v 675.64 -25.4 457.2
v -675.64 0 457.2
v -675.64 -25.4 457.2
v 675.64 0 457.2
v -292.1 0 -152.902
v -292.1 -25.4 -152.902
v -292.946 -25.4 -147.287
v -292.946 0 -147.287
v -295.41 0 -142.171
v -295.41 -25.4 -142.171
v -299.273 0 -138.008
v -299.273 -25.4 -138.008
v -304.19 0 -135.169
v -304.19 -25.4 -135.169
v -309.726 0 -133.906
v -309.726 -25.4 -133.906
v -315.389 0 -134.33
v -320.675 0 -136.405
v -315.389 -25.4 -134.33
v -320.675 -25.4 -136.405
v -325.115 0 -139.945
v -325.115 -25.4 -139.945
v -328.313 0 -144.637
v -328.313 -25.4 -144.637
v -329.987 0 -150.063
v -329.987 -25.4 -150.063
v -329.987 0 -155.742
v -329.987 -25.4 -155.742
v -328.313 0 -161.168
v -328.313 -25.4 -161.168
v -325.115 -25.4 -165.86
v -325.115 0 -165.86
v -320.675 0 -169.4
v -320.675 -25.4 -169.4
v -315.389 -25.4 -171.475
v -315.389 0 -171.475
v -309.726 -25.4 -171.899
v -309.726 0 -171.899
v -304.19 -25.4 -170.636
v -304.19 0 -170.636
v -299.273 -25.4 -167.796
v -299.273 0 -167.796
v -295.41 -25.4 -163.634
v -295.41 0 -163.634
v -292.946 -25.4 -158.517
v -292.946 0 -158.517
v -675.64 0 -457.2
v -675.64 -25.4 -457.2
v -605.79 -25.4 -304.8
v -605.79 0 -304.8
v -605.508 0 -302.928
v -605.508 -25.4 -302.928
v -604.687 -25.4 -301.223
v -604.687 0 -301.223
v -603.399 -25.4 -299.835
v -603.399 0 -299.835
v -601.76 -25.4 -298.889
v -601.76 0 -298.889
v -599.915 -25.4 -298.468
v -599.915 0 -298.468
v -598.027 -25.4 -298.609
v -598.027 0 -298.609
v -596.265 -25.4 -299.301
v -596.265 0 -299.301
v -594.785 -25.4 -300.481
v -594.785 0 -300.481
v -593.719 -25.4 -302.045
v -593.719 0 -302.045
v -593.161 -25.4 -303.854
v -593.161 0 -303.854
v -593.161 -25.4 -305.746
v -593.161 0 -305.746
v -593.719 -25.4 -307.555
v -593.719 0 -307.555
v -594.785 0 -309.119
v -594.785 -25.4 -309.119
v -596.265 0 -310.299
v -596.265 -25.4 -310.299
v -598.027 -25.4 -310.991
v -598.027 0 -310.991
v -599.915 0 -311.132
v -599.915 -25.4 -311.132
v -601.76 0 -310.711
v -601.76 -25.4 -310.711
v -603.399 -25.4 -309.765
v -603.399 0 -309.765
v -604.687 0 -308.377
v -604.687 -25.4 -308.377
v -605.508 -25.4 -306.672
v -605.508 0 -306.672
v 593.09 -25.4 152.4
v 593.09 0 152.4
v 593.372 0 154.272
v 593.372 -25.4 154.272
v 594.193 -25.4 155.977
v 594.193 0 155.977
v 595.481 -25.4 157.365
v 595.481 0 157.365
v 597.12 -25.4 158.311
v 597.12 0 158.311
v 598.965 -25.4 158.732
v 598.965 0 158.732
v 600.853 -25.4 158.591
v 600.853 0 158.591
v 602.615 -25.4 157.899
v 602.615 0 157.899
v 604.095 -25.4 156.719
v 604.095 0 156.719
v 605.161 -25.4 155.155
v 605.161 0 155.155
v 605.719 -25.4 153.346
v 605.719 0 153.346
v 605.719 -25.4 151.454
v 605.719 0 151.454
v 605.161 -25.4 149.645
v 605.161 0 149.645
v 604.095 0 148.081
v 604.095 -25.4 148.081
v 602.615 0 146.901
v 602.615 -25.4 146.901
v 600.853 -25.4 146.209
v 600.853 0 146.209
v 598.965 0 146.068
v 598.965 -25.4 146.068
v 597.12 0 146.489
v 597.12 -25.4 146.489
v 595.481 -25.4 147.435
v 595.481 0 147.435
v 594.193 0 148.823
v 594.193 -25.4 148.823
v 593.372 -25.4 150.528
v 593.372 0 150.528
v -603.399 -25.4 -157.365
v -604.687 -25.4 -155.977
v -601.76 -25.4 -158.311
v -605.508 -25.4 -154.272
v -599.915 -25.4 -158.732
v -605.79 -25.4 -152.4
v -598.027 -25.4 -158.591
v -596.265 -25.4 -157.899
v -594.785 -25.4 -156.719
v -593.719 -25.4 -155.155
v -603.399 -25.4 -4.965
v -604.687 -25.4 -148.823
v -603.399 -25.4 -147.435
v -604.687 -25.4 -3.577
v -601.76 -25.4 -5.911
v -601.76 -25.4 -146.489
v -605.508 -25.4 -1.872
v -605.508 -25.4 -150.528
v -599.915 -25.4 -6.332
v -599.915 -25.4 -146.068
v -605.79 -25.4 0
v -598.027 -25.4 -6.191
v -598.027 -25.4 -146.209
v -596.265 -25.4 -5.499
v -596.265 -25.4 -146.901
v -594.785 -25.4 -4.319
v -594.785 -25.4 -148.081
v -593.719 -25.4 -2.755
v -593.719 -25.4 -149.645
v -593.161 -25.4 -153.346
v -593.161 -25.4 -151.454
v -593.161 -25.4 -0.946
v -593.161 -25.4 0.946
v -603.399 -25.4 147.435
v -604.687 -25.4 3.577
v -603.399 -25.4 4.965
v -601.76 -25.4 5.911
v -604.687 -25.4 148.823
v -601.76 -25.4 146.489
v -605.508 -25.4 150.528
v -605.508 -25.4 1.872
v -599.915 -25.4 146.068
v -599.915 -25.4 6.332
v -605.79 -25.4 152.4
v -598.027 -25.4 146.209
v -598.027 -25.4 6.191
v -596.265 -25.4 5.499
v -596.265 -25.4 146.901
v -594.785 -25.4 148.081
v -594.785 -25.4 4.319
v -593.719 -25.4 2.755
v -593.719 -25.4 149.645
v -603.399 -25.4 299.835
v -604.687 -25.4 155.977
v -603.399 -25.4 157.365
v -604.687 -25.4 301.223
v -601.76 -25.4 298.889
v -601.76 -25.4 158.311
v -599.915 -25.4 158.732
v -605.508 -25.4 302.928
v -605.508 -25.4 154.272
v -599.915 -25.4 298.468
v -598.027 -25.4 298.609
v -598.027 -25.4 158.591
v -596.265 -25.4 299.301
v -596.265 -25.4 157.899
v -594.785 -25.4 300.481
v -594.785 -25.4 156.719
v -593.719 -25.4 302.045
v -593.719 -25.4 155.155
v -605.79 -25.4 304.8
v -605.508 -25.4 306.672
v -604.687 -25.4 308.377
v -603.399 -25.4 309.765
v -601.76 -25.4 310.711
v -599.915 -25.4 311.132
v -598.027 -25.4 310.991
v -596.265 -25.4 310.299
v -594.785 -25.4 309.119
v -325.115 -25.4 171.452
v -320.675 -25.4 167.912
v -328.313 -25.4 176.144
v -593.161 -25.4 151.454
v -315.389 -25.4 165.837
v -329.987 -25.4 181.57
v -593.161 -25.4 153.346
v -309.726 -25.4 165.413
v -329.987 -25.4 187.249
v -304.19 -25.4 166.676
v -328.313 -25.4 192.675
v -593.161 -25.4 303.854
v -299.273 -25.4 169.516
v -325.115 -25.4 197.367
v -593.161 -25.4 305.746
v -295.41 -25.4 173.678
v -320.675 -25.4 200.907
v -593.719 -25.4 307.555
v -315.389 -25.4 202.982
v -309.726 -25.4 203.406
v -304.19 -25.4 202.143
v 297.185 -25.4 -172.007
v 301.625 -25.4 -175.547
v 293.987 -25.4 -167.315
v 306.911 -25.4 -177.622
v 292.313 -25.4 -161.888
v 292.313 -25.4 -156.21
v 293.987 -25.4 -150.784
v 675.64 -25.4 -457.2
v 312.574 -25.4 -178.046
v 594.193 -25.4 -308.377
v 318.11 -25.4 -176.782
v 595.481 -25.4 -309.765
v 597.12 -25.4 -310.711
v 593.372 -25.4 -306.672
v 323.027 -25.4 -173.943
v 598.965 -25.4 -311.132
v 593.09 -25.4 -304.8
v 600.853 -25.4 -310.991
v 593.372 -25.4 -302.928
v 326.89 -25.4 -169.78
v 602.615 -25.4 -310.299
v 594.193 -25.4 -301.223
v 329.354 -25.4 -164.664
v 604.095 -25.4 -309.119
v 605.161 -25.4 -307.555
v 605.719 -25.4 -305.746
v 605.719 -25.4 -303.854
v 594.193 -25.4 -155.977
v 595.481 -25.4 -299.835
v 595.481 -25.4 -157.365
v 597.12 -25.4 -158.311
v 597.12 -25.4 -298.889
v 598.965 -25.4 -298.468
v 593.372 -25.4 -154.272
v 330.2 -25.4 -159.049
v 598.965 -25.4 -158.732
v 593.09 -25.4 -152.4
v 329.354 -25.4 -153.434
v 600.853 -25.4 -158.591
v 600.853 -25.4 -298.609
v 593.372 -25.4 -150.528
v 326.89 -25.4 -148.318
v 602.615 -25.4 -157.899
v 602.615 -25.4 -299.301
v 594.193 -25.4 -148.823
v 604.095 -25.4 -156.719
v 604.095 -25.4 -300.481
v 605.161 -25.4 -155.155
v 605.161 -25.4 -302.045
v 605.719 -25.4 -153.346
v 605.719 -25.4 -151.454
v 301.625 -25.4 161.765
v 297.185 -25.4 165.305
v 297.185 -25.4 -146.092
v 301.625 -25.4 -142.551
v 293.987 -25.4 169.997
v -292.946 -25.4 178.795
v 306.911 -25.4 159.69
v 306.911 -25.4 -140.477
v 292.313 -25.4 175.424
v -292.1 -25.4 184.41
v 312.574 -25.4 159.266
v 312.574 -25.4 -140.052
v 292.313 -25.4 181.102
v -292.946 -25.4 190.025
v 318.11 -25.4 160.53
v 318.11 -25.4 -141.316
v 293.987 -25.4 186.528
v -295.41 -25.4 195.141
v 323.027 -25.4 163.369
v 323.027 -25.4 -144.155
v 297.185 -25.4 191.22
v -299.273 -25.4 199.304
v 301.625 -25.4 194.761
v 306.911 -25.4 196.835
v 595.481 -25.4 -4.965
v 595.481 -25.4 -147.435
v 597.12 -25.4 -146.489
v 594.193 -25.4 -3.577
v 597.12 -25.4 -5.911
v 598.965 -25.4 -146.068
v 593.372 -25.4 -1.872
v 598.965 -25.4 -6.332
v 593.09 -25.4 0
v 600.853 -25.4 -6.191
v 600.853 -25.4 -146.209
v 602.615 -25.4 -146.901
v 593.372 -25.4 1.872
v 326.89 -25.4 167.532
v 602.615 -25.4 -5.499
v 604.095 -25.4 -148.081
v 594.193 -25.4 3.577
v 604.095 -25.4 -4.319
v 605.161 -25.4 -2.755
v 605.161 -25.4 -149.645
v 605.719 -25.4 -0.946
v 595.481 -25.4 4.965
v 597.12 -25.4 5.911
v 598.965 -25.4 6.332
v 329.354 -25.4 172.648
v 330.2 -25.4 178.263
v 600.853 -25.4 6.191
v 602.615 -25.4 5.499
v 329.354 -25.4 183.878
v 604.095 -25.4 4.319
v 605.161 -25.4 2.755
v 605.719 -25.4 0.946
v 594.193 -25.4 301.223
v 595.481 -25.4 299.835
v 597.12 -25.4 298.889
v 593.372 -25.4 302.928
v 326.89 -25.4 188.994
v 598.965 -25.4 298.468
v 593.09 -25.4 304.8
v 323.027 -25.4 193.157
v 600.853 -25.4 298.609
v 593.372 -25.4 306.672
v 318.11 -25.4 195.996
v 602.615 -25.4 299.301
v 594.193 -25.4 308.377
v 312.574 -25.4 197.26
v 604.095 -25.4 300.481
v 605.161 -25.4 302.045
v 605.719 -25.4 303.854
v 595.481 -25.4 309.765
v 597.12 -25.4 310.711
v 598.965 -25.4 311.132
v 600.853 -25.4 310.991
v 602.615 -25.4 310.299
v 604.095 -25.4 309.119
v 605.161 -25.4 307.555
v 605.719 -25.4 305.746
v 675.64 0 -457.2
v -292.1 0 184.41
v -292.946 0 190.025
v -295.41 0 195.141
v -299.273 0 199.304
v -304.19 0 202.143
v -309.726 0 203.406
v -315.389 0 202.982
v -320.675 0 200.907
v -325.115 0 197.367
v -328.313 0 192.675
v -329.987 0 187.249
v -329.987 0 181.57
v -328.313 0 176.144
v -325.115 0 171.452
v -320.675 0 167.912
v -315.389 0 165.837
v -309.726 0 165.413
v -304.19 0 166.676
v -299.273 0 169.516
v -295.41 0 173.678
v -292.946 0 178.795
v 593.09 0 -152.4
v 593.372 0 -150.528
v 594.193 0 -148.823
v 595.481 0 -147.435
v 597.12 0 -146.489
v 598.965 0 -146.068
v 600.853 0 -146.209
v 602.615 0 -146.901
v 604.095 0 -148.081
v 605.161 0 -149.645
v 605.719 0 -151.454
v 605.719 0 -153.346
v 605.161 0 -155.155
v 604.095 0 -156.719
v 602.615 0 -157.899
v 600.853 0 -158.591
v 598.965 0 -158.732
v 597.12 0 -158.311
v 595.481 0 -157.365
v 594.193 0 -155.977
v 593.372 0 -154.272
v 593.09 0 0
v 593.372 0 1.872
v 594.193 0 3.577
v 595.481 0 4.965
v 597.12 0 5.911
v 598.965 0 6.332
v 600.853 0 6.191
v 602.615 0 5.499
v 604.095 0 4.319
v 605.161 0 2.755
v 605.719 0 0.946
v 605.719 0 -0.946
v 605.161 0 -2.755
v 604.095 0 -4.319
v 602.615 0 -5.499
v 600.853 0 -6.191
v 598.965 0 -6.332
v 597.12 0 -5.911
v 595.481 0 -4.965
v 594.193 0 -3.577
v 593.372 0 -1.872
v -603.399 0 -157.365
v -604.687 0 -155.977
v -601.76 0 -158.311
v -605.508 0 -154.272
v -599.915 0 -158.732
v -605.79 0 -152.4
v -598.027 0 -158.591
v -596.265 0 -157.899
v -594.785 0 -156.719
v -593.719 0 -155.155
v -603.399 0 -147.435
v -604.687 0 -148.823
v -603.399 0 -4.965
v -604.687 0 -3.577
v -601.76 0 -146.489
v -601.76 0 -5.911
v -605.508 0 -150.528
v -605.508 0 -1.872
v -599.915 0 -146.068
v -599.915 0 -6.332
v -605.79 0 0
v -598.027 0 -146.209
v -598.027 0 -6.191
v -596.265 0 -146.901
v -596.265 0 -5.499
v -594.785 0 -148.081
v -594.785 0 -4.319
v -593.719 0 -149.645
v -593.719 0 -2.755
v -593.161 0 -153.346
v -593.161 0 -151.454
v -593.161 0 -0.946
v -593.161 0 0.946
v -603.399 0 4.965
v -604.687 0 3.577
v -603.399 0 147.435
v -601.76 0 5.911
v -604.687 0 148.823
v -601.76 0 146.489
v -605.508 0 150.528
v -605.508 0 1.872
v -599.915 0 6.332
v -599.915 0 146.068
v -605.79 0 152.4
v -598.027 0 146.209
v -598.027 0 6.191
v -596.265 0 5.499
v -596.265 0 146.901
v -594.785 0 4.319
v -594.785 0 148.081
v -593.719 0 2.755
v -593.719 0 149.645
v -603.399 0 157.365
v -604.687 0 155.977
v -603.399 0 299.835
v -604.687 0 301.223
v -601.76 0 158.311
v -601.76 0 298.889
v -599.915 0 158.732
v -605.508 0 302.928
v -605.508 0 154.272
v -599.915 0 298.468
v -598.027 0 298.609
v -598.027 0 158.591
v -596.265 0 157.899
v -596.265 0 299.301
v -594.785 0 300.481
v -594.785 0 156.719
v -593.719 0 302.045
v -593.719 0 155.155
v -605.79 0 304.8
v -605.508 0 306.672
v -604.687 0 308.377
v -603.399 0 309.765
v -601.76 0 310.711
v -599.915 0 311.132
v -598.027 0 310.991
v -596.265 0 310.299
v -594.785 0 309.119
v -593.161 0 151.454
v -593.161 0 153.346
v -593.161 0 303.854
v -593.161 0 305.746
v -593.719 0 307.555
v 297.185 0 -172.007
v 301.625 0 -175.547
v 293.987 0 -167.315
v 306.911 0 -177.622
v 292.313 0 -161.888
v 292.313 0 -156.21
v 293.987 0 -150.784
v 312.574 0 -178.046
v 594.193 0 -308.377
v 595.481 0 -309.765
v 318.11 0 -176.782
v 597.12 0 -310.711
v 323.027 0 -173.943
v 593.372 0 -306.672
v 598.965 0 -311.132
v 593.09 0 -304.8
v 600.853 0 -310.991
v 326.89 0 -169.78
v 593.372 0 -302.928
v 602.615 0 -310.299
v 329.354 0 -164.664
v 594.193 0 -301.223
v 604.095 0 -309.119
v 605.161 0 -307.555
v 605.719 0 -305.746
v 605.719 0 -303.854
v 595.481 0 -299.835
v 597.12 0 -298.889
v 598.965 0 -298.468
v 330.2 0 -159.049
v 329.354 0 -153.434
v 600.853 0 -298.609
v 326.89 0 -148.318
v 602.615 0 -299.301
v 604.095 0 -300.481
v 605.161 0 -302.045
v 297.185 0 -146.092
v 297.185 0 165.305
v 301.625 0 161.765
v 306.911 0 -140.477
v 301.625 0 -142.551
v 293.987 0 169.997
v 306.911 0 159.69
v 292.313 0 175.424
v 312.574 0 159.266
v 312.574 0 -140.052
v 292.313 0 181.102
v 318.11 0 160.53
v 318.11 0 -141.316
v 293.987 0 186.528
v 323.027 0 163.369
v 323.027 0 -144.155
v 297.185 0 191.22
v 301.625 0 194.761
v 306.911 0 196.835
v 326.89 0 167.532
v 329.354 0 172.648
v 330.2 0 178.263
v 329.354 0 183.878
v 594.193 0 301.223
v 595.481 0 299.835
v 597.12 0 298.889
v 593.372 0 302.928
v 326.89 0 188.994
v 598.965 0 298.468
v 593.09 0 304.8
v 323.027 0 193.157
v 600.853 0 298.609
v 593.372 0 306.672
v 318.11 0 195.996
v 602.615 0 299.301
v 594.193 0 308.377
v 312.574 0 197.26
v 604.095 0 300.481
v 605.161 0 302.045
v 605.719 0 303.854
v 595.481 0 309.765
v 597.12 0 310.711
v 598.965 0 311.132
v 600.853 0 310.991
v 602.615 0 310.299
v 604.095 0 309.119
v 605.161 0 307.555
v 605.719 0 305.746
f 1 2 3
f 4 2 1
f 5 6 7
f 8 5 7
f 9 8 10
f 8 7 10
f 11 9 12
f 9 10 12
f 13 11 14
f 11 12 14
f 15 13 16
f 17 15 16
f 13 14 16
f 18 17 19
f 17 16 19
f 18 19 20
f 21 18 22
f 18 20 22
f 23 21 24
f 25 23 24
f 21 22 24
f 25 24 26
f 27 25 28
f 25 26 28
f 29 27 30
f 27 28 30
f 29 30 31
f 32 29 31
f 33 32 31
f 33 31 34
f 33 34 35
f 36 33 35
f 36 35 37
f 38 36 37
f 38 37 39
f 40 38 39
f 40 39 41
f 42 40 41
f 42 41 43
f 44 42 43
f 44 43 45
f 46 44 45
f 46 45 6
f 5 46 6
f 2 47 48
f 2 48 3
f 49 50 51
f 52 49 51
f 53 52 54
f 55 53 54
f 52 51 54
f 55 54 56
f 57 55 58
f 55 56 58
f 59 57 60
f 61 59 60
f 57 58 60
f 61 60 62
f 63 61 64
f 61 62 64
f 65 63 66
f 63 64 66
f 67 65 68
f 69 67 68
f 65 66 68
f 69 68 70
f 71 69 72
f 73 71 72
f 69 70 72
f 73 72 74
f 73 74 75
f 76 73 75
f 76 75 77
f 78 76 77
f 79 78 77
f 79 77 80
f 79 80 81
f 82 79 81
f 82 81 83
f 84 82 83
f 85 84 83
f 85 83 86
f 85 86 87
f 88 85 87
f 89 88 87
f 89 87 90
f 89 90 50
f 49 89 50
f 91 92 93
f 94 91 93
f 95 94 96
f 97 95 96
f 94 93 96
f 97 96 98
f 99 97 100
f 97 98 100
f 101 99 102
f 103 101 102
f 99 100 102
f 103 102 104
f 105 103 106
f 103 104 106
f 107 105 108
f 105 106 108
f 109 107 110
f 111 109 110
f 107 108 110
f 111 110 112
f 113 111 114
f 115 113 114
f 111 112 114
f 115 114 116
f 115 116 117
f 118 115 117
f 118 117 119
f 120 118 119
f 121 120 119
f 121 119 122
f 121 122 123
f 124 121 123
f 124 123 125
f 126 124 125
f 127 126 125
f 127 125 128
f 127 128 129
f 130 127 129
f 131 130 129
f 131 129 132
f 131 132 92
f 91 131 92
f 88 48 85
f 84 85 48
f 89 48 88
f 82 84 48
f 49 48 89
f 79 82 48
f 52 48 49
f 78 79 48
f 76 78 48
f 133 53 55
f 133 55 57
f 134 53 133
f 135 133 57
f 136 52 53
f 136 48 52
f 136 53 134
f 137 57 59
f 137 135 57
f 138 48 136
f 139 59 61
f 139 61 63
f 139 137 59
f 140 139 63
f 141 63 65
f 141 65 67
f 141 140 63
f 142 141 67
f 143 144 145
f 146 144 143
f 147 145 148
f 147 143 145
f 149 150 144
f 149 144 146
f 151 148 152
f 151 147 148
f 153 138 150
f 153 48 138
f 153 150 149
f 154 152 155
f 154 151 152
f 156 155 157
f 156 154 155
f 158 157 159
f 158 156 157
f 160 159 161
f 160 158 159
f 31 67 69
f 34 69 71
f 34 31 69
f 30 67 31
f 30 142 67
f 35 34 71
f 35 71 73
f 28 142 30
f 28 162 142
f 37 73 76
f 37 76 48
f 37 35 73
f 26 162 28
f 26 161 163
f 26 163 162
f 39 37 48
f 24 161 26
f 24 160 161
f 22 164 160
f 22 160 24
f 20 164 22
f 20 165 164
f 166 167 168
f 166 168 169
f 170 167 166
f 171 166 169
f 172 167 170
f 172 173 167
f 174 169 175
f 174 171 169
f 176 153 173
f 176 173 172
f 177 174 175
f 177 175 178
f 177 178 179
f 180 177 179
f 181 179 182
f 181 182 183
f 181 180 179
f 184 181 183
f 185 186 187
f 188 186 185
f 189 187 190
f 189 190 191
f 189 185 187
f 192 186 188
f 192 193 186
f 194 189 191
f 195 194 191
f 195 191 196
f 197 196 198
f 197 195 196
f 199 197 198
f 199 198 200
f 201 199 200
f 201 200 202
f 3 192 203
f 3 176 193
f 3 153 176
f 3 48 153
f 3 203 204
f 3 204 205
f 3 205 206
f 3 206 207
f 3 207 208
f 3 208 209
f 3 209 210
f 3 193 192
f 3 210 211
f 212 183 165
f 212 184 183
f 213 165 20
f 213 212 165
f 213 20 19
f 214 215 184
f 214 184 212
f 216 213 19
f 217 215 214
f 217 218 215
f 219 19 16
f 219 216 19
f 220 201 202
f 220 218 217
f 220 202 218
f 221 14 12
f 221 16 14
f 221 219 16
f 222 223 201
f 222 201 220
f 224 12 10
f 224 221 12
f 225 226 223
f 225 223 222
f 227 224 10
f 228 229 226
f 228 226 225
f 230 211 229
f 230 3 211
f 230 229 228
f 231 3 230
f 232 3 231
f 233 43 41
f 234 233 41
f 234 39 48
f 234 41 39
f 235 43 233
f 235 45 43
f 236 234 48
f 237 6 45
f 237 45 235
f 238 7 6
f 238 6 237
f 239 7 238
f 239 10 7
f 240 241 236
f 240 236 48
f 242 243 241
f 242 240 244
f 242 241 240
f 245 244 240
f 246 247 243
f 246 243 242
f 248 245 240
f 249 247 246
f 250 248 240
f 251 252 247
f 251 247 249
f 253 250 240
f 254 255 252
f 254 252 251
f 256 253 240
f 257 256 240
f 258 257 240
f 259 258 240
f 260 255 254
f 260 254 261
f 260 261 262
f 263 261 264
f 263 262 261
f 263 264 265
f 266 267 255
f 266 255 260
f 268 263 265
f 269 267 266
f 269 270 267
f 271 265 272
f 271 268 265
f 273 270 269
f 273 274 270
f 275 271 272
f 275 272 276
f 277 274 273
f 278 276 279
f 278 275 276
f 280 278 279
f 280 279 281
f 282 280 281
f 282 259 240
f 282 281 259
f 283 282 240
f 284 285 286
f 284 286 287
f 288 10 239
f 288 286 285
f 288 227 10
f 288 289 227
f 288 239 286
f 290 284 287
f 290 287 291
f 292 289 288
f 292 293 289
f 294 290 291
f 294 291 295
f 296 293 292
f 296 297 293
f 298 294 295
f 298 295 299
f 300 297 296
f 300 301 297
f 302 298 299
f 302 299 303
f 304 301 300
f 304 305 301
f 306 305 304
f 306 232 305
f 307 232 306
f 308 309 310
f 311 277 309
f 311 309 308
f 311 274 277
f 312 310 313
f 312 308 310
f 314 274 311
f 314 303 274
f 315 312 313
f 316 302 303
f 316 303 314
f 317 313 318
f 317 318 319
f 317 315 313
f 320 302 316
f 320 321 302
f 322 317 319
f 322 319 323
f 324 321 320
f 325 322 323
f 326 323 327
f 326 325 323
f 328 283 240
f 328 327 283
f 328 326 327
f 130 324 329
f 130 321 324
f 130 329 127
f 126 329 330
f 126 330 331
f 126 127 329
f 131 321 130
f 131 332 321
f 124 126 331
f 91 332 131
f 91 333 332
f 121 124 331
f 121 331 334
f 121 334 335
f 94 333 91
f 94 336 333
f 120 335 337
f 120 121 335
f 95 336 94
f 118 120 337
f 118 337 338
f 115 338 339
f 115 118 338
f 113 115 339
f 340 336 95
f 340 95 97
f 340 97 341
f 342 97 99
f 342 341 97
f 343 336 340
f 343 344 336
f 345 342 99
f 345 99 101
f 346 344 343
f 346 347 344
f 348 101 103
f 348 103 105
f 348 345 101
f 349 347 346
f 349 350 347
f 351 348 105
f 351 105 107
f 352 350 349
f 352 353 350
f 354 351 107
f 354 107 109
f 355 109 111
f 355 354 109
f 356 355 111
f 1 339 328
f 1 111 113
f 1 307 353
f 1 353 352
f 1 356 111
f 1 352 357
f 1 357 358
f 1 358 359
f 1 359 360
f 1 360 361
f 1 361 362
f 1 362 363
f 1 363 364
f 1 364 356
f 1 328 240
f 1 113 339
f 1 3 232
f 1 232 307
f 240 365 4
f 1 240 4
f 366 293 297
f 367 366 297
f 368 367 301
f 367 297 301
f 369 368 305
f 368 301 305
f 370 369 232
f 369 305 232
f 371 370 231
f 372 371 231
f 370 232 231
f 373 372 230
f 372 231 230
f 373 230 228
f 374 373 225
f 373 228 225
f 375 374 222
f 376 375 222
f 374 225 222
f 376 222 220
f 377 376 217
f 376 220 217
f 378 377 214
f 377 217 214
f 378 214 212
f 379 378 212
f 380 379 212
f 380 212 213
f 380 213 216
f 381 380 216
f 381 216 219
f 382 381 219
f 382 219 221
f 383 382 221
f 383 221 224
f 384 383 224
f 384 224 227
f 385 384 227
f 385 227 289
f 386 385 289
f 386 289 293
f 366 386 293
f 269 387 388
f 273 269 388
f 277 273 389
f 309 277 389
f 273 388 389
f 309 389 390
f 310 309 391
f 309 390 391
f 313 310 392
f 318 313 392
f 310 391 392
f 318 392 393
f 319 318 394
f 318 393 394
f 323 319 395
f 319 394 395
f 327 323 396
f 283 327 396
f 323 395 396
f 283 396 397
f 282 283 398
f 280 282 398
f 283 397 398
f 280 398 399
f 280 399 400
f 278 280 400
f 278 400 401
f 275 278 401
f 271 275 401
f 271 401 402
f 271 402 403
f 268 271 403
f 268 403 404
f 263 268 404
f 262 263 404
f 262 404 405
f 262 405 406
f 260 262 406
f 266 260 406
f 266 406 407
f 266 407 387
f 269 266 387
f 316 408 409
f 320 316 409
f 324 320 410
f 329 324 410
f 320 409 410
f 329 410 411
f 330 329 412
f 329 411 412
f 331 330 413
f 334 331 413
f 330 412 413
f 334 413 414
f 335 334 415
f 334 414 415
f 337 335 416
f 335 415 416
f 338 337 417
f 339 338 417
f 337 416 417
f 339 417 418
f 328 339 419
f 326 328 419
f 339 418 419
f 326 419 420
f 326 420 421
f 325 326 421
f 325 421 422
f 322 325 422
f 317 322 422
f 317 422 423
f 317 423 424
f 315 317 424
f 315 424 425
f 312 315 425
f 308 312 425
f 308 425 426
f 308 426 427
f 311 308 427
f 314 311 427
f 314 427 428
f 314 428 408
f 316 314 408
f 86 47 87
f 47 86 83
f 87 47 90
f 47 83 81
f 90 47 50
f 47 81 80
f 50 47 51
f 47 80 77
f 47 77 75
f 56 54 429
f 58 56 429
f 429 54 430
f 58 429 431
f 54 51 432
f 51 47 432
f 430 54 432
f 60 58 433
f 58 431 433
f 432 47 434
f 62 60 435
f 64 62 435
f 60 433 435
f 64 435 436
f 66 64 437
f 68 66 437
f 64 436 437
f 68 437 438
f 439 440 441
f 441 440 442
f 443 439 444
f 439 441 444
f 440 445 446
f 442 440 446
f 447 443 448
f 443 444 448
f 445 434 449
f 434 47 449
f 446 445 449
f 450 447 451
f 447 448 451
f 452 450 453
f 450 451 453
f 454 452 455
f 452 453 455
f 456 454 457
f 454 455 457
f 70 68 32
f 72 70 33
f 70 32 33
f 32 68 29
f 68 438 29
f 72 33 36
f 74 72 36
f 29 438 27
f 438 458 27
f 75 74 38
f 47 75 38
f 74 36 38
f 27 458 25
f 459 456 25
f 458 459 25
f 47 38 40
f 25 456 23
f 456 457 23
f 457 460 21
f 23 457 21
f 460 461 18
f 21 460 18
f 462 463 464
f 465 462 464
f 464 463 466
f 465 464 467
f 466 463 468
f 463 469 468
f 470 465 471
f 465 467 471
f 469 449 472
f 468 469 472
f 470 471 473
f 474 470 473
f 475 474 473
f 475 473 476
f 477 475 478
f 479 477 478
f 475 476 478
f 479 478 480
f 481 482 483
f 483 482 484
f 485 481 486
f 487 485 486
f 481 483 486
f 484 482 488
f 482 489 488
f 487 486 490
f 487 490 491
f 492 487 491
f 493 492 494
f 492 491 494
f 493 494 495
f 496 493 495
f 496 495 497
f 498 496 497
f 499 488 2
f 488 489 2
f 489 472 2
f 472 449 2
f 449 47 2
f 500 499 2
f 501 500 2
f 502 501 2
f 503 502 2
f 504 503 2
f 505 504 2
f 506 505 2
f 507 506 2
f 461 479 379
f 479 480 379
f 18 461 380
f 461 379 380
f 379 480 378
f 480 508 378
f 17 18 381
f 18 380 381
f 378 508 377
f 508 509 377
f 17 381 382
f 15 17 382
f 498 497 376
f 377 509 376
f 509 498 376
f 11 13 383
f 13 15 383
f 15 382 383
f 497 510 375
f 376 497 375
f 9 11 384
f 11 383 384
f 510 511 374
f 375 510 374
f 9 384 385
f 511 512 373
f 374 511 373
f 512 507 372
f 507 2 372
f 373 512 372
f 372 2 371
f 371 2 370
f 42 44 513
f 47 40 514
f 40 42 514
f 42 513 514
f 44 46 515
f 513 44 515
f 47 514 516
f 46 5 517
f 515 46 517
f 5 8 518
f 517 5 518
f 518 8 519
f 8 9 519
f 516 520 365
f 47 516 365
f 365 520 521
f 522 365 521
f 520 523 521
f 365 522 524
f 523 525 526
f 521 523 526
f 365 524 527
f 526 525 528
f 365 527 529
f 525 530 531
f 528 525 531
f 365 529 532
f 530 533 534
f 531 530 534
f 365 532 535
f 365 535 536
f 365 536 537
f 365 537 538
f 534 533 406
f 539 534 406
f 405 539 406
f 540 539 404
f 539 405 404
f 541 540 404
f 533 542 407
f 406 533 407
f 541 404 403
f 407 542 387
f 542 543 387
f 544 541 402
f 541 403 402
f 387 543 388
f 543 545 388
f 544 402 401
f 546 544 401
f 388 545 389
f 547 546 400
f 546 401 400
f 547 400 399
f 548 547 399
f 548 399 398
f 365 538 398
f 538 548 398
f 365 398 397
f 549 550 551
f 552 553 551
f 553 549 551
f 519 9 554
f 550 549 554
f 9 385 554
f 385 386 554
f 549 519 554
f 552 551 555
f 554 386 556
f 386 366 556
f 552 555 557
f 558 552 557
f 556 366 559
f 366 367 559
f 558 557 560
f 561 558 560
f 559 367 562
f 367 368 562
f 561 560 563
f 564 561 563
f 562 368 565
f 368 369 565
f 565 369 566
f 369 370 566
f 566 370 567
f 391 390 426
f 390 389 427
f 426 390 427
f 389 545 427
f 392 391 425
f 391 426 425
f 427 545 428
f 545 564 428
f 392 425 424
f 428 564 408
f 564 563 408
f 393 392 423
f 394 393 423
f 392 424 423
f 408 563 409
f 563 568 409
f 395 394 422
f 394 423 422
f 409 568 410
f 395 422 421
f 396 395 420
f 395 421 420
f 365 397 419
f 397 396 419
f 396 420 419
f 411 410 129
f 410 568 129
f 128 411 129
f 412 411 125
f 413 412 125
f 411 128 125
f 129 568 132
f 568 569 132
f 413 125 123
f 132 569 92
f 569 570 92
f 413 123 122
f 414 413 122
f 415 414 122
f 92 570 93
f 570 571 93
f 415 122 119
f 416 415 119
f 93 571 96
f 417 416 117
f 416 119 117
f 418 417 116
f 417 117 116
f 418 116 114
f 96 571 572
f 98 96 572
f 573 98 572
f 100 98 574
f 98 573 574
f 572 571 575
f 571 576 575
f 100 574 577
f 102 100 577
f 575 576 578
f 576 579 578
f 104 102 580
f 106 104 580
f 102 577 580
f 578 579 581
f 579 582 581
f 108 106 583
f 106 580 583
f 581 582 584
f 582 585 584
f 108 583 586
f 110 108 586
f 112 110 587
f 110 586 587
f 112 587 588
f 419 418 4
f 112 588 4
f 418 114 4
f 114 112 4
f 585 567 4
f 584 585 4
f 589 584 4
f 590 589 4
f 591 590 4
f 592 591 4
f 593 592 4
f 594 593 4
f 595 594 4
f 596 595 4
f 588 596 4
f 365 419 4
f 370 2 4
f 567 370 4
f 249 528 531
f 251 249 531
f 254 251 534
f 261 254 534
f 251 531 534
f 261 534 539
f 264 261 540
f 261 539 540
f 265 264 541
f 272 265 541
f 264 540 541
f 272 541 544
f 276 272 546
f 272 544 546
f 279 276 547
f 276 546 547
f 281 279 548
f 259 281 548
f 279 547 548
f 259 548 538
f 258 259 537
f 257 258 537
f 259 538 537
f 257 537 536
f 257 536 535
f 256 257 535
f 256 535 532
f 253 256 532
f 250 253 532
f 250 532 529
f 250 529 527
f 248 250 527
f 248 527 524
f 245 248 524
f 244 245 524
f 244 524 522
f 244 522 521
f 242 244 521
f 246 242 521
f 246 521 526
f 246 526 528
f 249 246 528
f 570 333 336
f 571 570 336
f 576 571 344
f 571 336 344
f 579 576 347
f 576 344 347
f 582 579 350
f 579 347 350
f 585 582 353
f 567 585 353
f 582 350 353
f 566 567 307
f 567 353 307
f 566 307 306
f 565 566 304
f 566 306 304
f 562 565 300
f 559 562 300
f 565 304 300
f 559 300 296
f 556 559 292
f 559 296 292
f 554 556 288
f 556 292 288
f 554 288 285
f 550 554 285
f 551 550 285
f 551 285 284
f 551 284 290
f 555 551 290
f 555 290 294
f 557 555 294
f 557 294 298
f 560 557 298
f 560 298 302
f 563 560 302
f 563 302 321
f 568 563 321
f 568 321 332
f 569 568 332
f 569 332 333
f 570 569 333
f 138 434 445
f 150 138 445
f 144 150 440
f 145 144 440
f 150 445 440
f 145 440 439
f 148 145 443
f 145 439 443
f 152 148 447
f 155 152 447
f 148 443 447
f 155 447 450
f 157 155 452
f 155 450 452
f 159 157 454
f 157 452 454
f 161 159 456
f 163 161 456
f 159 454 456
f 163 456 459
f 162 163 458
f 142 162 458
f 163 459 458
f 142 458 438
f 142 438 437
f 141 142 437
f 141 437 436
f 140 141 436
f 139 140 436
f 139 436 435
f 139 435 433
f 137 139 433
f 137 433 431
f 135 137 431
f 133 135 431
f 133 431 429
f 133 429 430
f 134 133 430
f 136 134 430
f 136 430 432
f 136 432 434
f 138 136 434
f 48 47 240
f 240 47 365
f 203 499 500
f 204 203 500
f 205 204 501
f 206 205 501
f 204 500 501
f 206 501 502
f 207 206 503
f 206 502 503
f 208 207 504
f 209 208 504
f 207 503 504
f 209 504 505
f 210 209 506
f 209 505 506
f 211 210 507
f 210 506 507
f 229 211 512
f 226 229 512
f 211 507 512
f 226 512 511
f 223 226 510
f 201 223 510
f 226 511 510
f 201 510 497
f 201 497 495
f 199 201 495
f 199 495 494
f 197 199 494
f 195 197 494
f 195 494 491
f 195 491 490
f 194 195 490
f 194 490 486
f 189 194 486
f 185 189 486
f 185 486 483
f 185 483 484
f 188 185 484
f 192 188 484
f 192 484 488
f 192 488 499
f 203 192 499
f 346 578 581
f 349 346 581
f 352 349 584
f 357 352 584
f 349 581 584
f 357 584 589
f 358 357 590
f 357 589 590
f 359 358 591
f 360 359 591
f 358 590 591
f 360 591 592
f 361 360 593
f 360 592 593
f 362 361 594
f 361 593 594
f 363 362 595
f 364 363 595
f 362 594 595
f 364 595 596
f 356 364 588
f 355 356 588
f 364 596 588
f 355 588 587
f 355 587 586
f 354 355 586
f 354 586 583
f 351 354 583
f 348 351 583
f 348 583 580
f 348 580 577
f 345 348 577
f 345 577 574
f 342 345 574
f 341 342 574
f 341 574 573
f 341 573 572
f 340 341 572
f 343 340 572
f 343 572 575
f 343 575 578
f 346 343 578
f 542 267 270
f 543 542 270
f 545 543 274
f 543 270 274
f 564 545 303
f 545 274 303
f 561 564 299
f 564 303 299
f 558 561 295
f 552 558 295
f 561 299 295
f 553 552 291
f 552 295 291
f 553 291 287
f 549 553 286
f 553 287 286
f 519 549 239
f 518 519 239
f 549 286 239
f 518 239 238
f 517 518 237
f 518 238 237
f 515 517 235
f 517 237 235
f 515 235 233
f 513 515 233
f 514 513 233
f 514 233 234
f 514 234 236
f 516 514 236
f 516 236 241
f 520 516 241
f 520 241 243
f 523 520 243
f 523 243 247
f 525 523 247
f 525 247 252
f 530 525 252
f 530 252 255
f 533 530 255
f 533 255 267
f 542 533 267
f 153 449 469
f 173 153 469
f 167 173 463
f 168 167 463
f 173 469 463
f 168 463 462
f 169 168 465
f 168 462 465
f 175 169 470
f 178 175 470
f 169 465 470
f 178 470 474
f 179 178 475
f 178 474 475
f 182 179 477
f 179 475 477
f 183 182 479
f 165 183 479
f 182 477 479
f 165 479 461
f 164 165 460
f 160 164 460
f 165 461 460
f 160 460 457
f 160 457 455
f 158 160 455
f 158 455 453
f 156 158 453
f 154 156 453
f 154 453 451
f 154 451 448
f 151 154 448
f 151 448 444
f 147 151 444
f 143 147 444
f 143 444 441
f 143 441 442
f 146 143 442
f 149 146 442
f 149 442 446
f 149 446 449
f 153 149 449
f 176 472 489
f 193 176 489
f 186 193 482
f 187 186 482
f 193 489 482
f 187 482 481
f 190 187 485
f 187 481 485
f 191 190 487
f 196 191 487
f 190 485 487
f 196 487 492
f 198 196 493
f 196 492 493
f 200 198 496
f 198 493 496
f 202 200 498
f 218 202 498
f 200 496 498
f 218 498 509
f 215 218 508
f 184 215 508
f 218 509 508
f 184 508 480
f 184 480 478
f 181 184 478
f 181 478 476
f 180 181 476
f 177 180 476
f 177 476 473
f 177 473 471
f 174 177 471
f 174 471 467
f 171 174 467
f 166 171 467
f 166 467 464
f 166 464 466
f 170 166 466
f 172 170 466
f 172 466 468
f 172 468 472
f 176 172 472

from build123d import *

# Parameters (mm, degrees)
F0_W     = 1351.28
F0_H     = 914.4
F1_DEPTH = 25.4
F3_D     = 12.7
F4_R     = 19.05
F5_DEPTH = 127


with BuildPart() as f1:
    # F0 (on Front) → F1 (new body)
    with BuildSketch(Plane.XZ):
        Rectangle(F0_W, F0_H)
    extrude(amount=F1_DEPTH)

    # F3 (through all)
    with Locations(Plane.XZ.offset(25.4)):
        with Locations((-599.44, -152.4), (-599.44, 0), (-599.44, 152.4), (-599.44, 304.8), (-599.44, -304.8), (599.44, 304.8), (599.44, 152.4), (599.44, 0), (599.44, -152.4), (599.44, -304.8)):
            Hole(F3_D / 2)

    # F4 (on face) → F5 (cut)
    with BuildSketch(Plane.XZ.offset(25.4)):
        with Locations((-311.15, 184.40962)):
            Circle(F4_R)
        with Locations((-311.15, -152.90238)):
            Circle(F4_R)
        with Locations((311.15, -159.049213)):
            Circle(F4_R)
        with Locations((311.15, 178.262787)):
            Circle(F4_R)
    extrude(amount=-F5_DEPTH, mode=Mode.SUBTRACT)


solid = f1.part
